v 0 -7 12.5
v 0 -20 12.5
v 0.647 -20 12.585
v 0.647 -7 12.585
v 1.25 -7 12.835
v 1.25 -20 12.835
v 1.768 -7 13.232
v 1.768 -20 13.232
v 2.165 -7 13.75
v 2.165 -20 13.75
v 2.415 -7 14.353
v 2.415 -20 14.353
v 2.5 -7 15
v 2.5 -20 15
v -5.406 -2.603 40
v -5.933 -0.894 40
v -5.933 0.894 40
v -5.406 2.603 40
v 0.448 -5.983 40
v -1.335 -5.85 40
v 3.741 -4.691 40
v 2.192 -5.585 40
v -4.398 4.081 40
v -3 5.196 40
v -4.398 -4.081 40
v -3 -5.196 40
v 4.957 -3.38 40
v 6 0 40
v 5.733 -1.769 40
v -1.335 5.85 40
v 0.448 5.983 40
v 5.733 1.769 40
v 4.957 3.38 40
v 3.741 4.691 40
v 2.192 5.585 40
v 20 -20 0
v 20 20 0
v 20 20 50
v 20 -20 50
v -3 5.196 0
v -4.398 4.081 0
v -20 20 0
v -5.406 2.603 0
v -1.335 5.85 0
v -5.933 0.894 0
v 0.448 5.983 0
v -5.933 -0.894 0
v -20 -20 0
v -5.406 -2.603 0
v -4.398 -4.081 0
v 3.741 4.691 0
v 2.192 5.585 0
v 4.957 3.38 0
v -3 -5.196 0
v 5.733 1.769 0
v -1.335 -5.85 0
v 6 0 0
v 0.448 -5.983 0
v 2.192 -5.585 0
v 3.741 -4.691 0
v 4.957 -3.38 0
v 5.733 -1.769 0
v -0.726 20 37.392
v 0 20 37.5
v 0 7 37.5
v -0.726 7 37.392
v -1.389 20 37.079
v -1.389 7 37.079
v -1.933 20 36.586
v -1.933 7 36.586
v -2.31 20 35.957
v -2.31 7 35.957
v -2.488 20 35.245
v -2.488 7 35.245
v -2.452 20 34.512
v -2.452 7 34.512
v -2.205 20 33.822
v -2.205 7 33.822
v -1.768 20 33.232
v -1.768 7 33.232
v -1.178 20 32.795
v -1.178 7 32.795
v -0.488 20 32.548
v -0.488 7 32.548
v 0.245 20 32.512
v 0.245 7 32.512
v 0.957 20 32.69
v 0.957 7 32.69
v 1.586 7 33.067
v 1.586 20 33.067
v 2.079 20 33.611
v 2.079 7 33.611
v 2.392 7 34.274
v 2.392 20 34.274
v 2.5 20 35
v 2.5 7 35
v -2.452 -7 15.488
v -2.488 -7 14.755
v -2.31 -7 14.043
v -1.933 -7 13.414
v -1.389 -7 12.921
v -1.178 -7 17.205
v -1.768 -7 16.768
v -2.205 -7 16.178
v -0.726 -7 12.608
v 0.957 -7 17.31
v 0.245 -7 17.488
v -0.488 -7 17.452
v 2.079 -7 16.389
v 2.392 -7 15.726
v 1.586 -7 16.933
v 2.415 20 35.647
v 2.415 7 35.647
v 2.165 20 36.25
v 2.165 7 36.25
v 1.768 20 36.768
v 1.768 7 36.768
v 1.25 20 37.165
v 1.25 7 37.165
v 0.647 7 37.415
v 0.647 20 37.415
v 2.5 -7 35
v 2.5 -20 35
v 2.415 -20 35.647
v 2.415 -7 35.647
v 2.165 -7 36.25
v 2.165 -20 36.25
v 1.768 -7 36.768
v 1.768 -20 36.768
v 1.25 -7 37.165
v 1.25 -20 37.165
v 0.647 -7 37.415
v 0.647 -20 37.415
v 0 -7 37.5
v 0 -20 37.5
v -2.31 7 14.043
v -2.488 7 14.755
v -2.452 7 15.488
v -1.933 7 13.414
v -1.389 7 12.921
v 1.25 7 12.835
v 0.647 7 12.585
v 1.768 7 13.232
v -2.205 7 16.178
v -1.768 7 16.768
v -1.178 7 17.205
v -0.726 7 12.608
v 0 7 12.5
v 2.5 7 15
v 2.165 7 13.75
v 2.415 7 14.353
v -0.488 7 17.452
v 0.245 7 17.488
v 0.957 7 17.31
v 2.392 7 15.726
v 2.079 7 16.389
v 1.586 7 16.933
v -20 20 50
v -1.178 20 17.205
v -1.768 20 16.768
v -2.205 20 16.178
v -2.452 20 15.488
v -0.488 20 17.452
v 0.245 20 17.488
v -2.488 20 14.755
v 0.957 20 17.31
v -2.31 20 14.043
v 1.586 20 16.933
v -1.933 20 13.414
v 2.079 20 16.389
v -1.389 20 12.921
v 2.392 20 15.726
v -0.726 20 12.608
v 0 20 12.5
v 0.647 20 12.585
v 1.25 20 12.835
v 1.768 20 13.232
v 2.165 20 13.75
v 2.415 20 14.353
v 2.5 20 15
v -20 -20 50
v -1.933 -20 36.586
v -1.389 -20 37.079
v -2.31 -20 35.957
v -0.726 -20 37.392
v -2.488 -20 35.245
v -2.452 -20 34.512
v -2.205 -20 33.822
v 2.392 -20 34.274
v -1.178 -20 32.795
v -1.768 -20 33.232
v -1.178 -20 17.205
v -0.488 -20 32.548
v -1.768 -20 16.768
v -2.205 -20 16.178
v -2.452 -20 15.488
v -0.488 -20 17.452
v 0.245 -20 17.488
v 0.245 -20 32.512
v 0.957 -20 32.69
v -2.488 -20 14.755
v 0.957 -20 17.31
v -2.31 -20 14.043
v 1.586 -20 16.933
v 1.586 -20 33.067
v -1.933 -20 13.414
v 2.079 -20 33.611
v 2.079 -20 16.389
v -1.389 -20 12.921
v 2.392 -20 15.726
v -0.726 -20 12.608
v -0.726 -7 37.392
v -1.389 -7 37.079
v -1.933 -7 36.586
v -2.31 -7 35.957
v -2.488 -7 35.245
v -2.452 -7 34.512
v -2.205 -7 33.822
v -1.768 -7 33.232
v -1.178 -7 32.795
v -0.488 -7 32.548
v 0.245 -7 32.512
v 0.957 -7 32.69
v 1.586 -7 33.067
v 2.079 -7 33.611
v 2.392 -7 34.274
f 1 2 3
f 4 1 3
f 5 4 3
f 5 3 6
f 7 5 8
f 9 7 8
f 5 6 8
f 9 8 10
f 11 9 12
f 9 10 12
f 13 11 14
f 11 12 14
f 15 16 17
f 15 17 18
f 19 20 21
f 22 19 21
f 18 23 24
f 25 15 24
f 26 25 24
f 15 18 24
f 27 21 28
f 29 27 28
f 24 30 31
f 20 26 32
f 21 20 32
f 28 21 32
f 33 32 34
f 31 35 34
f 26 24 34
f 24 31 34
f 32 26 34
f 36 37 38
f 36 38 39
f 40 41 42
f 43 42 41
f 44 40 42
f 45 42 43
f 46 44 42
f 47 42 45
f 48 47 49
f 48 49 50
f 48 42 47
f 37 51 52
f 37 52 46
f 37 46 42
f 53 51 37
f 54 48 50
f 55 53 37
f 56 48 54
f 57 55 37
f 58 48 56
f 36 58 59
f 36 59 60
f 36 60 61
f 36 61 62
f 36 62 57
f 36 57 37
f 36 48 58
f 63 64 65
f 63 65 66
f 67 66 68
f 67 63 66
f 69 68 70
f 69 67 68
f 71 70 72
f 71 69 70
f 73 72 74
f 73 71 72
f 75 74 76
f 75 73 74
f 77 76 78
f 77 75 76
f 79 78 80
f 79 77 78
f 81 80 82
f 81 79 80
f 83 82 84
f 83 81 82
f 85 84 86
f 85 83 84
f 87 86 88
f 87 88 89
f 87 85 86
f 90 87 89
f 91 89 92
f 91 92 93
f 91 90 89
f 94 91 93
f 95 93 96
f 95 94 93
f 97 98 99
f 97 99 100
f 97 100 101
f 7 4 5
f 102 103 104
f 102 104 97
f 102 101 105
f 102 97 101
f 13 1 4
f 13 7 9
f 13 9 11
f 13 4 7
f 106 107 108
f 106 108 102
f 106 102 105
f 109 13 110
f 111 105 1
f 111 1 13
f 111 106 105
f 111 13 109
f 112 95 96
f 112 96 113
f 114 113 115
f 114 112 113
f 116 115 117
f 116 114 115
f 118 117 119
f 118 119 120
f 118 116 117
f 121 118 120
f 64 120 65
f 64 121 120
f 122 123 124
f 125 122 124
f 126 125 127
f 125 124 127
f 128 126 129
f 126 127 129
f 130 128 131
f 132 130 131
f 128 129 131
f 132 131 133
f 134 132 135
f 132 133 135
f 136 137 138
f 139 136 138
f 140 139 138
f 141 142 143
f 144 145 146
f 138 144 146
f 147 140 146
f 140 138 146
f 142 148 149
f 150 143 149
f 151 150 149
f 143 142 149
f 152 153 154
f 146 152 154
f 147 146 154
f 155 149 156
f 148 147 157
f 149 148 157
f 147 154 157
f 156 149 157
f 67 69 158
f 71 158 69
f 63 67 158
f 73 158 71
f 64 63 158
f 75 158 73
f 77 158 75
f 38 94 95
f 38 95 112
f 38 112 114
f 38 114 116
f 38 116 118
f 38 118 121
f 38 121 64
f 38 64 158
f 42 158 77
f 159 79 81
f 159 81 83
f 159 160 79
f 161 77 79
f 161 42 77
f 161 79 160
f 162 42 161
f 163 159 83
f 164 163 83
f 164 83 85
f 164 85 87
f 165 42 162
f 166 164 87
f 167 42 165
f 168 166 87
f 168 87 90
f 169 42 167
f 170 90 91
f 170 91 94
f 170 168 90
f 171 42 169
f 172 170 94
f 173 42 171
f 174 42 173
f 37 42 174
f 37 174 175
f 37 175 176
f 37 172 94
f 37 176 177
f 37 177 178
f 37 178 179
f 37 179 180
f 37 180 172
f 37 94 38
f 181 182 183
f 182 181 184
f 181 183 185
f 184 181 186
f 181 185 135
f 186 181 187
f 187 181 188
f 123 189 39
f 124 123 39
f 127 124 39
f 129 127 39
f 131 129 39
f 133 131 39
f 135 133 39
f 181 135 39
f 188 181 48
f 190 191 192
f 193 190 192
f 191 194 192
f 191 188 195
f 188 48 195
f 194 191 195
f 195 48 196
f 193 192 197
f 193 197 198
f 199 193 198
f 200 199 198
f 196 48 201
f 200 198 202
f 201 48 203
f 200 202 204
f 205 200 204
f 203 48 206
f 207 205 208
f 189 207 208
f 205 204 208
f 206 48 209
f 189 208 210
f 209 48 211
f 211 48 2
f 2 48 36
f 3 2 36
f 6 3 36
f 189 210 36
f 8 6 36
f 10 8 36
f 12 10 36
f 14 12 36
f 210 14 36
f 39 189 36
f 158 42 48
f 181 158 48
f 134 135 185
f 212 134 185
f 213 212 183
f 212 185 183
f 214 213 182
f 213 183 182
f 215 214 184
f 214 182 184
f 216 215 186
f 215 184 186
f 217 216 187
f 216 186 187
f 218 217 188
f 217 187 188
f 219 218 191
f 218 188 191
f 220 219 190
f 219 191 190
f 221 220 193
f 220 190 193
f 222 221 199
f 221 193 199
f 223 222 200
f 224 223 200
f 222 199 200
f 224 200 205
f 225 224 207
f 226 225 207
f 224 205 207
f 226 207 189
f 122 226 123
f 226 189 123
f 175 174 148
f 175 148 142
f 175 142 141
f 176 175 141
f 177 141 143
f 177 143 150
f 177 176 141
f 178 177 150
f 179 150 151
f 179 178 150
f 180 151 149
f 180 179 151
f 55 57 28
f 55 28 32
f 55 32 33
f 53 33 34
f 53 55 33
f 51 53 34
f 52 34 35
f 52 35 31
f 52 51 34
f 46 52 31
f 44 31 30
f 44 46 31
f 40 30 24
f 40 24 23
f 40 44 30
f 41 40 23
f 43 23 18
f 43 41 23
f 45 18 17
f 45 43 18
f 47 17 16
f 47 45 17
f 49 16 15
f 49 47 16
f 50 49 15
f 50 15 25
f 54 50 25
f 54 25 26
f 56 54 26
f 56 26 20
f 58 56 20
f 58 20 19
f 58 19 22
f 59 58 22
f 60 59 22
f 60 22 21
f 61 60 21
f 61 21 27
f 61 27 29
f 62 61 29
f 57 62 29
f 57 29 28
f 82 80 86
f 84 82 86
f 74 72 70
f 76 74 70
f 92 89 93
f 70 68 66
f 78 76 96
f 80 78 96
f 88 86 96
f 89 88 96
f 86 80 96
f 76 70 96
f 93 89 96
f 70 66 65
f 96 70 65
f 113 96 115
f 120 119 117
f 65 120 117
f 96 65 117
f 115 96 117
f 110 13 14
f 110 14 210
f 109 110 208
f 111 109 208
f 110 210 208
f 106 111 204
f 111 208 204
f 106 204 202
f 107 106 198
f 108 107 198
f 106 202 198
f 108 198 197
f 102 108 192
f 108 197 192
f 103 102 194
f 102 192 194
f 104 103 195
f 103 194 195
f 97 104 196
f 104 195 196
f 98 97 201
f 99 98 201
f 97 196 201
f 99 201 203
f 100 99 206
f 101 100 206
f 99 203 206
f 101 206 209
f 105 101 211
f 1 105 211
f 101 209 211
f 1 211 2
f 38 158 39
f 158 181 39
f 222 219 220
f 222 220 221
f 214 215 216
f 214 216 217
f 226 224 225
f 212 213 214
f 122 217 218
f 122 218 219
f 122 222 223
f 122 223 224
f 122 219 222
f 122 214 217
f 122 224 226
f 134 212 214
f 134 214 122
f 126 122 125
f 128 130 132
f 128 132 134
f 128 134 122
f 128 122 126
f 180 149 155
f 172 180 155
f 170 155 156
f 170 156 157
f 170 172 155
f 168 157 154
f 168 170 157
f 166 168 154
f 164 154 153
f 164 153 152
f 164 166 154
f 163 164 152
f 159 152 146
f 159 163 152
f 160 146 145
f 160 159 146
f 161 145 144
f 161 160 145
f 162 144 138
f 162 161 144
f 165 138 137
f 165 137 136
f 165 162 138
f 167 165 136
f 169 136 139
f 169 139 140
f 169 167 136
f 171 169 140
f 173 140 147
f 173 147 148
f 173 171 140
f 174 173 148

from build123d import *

# Parameters (mm, degrees)
F0_W     = 40
F0_H     = 40
F1_DEPTH = 50
F2_R     = 6
F3_DEPTH = 40
F5_DEPTH = 13
F6_DEPTH = 20


with BuildPart() as f1:
    # F0 (on Top) → F1 (new body)
    with BuildSketch(Plane.XY):
        Rectangle(F0_W, F0_H)
    extrude(amount=F1_DEPTH)

    # F2 (on face) → F3 (cut)
    with BuildSketch(Plane(origin=(0, 0, 0), x_dir=(1, 0, 0), z_dir=(0, 0, -1))):
        Circle(F2_R)
    extrude(amount=-F3_DEPTH, mode=Mode.SUBTRACT)

    # F4 (on face) → F5 (cut)
    with BuildSketch(Plane.XZ.offset(20)):
        with BuildLine():
            ThreePointArc((2.5, 35), (1.767766953, 36.767766953), (0, 37.5))
            ThreePointArc((0, 37.5), (-1.767766953, 33.232233047), (2.5, 35))
        make_face()
        with BuildLine():
            ThreePointArc((2.5, 15), (-1.767766953, 16.767766953), (0, 12.5))
            ThreePointArc((0, 12.5), (1.767766953, 13.232233047), (2.5, 15))
        make_face()
    extrude(amount=-F5_DEPTH, mode=Mode.SUBTRACT)

    # F6 (cut): a face of the model
    f6_faces = [f1.faces().sort_by_distance(p)[0] for p in [
        (0, 20, 25),
    ]]
    extrude(f6_faces, amount=-F6_DEPTH, mode=Mode.SUBTRACT)

    # F7: F1 across plane


with BuildPart() as f1_1:
    add(f1.part)
    add(f1.part.mirror(Plane.XZ))


solid = f1_1.part
